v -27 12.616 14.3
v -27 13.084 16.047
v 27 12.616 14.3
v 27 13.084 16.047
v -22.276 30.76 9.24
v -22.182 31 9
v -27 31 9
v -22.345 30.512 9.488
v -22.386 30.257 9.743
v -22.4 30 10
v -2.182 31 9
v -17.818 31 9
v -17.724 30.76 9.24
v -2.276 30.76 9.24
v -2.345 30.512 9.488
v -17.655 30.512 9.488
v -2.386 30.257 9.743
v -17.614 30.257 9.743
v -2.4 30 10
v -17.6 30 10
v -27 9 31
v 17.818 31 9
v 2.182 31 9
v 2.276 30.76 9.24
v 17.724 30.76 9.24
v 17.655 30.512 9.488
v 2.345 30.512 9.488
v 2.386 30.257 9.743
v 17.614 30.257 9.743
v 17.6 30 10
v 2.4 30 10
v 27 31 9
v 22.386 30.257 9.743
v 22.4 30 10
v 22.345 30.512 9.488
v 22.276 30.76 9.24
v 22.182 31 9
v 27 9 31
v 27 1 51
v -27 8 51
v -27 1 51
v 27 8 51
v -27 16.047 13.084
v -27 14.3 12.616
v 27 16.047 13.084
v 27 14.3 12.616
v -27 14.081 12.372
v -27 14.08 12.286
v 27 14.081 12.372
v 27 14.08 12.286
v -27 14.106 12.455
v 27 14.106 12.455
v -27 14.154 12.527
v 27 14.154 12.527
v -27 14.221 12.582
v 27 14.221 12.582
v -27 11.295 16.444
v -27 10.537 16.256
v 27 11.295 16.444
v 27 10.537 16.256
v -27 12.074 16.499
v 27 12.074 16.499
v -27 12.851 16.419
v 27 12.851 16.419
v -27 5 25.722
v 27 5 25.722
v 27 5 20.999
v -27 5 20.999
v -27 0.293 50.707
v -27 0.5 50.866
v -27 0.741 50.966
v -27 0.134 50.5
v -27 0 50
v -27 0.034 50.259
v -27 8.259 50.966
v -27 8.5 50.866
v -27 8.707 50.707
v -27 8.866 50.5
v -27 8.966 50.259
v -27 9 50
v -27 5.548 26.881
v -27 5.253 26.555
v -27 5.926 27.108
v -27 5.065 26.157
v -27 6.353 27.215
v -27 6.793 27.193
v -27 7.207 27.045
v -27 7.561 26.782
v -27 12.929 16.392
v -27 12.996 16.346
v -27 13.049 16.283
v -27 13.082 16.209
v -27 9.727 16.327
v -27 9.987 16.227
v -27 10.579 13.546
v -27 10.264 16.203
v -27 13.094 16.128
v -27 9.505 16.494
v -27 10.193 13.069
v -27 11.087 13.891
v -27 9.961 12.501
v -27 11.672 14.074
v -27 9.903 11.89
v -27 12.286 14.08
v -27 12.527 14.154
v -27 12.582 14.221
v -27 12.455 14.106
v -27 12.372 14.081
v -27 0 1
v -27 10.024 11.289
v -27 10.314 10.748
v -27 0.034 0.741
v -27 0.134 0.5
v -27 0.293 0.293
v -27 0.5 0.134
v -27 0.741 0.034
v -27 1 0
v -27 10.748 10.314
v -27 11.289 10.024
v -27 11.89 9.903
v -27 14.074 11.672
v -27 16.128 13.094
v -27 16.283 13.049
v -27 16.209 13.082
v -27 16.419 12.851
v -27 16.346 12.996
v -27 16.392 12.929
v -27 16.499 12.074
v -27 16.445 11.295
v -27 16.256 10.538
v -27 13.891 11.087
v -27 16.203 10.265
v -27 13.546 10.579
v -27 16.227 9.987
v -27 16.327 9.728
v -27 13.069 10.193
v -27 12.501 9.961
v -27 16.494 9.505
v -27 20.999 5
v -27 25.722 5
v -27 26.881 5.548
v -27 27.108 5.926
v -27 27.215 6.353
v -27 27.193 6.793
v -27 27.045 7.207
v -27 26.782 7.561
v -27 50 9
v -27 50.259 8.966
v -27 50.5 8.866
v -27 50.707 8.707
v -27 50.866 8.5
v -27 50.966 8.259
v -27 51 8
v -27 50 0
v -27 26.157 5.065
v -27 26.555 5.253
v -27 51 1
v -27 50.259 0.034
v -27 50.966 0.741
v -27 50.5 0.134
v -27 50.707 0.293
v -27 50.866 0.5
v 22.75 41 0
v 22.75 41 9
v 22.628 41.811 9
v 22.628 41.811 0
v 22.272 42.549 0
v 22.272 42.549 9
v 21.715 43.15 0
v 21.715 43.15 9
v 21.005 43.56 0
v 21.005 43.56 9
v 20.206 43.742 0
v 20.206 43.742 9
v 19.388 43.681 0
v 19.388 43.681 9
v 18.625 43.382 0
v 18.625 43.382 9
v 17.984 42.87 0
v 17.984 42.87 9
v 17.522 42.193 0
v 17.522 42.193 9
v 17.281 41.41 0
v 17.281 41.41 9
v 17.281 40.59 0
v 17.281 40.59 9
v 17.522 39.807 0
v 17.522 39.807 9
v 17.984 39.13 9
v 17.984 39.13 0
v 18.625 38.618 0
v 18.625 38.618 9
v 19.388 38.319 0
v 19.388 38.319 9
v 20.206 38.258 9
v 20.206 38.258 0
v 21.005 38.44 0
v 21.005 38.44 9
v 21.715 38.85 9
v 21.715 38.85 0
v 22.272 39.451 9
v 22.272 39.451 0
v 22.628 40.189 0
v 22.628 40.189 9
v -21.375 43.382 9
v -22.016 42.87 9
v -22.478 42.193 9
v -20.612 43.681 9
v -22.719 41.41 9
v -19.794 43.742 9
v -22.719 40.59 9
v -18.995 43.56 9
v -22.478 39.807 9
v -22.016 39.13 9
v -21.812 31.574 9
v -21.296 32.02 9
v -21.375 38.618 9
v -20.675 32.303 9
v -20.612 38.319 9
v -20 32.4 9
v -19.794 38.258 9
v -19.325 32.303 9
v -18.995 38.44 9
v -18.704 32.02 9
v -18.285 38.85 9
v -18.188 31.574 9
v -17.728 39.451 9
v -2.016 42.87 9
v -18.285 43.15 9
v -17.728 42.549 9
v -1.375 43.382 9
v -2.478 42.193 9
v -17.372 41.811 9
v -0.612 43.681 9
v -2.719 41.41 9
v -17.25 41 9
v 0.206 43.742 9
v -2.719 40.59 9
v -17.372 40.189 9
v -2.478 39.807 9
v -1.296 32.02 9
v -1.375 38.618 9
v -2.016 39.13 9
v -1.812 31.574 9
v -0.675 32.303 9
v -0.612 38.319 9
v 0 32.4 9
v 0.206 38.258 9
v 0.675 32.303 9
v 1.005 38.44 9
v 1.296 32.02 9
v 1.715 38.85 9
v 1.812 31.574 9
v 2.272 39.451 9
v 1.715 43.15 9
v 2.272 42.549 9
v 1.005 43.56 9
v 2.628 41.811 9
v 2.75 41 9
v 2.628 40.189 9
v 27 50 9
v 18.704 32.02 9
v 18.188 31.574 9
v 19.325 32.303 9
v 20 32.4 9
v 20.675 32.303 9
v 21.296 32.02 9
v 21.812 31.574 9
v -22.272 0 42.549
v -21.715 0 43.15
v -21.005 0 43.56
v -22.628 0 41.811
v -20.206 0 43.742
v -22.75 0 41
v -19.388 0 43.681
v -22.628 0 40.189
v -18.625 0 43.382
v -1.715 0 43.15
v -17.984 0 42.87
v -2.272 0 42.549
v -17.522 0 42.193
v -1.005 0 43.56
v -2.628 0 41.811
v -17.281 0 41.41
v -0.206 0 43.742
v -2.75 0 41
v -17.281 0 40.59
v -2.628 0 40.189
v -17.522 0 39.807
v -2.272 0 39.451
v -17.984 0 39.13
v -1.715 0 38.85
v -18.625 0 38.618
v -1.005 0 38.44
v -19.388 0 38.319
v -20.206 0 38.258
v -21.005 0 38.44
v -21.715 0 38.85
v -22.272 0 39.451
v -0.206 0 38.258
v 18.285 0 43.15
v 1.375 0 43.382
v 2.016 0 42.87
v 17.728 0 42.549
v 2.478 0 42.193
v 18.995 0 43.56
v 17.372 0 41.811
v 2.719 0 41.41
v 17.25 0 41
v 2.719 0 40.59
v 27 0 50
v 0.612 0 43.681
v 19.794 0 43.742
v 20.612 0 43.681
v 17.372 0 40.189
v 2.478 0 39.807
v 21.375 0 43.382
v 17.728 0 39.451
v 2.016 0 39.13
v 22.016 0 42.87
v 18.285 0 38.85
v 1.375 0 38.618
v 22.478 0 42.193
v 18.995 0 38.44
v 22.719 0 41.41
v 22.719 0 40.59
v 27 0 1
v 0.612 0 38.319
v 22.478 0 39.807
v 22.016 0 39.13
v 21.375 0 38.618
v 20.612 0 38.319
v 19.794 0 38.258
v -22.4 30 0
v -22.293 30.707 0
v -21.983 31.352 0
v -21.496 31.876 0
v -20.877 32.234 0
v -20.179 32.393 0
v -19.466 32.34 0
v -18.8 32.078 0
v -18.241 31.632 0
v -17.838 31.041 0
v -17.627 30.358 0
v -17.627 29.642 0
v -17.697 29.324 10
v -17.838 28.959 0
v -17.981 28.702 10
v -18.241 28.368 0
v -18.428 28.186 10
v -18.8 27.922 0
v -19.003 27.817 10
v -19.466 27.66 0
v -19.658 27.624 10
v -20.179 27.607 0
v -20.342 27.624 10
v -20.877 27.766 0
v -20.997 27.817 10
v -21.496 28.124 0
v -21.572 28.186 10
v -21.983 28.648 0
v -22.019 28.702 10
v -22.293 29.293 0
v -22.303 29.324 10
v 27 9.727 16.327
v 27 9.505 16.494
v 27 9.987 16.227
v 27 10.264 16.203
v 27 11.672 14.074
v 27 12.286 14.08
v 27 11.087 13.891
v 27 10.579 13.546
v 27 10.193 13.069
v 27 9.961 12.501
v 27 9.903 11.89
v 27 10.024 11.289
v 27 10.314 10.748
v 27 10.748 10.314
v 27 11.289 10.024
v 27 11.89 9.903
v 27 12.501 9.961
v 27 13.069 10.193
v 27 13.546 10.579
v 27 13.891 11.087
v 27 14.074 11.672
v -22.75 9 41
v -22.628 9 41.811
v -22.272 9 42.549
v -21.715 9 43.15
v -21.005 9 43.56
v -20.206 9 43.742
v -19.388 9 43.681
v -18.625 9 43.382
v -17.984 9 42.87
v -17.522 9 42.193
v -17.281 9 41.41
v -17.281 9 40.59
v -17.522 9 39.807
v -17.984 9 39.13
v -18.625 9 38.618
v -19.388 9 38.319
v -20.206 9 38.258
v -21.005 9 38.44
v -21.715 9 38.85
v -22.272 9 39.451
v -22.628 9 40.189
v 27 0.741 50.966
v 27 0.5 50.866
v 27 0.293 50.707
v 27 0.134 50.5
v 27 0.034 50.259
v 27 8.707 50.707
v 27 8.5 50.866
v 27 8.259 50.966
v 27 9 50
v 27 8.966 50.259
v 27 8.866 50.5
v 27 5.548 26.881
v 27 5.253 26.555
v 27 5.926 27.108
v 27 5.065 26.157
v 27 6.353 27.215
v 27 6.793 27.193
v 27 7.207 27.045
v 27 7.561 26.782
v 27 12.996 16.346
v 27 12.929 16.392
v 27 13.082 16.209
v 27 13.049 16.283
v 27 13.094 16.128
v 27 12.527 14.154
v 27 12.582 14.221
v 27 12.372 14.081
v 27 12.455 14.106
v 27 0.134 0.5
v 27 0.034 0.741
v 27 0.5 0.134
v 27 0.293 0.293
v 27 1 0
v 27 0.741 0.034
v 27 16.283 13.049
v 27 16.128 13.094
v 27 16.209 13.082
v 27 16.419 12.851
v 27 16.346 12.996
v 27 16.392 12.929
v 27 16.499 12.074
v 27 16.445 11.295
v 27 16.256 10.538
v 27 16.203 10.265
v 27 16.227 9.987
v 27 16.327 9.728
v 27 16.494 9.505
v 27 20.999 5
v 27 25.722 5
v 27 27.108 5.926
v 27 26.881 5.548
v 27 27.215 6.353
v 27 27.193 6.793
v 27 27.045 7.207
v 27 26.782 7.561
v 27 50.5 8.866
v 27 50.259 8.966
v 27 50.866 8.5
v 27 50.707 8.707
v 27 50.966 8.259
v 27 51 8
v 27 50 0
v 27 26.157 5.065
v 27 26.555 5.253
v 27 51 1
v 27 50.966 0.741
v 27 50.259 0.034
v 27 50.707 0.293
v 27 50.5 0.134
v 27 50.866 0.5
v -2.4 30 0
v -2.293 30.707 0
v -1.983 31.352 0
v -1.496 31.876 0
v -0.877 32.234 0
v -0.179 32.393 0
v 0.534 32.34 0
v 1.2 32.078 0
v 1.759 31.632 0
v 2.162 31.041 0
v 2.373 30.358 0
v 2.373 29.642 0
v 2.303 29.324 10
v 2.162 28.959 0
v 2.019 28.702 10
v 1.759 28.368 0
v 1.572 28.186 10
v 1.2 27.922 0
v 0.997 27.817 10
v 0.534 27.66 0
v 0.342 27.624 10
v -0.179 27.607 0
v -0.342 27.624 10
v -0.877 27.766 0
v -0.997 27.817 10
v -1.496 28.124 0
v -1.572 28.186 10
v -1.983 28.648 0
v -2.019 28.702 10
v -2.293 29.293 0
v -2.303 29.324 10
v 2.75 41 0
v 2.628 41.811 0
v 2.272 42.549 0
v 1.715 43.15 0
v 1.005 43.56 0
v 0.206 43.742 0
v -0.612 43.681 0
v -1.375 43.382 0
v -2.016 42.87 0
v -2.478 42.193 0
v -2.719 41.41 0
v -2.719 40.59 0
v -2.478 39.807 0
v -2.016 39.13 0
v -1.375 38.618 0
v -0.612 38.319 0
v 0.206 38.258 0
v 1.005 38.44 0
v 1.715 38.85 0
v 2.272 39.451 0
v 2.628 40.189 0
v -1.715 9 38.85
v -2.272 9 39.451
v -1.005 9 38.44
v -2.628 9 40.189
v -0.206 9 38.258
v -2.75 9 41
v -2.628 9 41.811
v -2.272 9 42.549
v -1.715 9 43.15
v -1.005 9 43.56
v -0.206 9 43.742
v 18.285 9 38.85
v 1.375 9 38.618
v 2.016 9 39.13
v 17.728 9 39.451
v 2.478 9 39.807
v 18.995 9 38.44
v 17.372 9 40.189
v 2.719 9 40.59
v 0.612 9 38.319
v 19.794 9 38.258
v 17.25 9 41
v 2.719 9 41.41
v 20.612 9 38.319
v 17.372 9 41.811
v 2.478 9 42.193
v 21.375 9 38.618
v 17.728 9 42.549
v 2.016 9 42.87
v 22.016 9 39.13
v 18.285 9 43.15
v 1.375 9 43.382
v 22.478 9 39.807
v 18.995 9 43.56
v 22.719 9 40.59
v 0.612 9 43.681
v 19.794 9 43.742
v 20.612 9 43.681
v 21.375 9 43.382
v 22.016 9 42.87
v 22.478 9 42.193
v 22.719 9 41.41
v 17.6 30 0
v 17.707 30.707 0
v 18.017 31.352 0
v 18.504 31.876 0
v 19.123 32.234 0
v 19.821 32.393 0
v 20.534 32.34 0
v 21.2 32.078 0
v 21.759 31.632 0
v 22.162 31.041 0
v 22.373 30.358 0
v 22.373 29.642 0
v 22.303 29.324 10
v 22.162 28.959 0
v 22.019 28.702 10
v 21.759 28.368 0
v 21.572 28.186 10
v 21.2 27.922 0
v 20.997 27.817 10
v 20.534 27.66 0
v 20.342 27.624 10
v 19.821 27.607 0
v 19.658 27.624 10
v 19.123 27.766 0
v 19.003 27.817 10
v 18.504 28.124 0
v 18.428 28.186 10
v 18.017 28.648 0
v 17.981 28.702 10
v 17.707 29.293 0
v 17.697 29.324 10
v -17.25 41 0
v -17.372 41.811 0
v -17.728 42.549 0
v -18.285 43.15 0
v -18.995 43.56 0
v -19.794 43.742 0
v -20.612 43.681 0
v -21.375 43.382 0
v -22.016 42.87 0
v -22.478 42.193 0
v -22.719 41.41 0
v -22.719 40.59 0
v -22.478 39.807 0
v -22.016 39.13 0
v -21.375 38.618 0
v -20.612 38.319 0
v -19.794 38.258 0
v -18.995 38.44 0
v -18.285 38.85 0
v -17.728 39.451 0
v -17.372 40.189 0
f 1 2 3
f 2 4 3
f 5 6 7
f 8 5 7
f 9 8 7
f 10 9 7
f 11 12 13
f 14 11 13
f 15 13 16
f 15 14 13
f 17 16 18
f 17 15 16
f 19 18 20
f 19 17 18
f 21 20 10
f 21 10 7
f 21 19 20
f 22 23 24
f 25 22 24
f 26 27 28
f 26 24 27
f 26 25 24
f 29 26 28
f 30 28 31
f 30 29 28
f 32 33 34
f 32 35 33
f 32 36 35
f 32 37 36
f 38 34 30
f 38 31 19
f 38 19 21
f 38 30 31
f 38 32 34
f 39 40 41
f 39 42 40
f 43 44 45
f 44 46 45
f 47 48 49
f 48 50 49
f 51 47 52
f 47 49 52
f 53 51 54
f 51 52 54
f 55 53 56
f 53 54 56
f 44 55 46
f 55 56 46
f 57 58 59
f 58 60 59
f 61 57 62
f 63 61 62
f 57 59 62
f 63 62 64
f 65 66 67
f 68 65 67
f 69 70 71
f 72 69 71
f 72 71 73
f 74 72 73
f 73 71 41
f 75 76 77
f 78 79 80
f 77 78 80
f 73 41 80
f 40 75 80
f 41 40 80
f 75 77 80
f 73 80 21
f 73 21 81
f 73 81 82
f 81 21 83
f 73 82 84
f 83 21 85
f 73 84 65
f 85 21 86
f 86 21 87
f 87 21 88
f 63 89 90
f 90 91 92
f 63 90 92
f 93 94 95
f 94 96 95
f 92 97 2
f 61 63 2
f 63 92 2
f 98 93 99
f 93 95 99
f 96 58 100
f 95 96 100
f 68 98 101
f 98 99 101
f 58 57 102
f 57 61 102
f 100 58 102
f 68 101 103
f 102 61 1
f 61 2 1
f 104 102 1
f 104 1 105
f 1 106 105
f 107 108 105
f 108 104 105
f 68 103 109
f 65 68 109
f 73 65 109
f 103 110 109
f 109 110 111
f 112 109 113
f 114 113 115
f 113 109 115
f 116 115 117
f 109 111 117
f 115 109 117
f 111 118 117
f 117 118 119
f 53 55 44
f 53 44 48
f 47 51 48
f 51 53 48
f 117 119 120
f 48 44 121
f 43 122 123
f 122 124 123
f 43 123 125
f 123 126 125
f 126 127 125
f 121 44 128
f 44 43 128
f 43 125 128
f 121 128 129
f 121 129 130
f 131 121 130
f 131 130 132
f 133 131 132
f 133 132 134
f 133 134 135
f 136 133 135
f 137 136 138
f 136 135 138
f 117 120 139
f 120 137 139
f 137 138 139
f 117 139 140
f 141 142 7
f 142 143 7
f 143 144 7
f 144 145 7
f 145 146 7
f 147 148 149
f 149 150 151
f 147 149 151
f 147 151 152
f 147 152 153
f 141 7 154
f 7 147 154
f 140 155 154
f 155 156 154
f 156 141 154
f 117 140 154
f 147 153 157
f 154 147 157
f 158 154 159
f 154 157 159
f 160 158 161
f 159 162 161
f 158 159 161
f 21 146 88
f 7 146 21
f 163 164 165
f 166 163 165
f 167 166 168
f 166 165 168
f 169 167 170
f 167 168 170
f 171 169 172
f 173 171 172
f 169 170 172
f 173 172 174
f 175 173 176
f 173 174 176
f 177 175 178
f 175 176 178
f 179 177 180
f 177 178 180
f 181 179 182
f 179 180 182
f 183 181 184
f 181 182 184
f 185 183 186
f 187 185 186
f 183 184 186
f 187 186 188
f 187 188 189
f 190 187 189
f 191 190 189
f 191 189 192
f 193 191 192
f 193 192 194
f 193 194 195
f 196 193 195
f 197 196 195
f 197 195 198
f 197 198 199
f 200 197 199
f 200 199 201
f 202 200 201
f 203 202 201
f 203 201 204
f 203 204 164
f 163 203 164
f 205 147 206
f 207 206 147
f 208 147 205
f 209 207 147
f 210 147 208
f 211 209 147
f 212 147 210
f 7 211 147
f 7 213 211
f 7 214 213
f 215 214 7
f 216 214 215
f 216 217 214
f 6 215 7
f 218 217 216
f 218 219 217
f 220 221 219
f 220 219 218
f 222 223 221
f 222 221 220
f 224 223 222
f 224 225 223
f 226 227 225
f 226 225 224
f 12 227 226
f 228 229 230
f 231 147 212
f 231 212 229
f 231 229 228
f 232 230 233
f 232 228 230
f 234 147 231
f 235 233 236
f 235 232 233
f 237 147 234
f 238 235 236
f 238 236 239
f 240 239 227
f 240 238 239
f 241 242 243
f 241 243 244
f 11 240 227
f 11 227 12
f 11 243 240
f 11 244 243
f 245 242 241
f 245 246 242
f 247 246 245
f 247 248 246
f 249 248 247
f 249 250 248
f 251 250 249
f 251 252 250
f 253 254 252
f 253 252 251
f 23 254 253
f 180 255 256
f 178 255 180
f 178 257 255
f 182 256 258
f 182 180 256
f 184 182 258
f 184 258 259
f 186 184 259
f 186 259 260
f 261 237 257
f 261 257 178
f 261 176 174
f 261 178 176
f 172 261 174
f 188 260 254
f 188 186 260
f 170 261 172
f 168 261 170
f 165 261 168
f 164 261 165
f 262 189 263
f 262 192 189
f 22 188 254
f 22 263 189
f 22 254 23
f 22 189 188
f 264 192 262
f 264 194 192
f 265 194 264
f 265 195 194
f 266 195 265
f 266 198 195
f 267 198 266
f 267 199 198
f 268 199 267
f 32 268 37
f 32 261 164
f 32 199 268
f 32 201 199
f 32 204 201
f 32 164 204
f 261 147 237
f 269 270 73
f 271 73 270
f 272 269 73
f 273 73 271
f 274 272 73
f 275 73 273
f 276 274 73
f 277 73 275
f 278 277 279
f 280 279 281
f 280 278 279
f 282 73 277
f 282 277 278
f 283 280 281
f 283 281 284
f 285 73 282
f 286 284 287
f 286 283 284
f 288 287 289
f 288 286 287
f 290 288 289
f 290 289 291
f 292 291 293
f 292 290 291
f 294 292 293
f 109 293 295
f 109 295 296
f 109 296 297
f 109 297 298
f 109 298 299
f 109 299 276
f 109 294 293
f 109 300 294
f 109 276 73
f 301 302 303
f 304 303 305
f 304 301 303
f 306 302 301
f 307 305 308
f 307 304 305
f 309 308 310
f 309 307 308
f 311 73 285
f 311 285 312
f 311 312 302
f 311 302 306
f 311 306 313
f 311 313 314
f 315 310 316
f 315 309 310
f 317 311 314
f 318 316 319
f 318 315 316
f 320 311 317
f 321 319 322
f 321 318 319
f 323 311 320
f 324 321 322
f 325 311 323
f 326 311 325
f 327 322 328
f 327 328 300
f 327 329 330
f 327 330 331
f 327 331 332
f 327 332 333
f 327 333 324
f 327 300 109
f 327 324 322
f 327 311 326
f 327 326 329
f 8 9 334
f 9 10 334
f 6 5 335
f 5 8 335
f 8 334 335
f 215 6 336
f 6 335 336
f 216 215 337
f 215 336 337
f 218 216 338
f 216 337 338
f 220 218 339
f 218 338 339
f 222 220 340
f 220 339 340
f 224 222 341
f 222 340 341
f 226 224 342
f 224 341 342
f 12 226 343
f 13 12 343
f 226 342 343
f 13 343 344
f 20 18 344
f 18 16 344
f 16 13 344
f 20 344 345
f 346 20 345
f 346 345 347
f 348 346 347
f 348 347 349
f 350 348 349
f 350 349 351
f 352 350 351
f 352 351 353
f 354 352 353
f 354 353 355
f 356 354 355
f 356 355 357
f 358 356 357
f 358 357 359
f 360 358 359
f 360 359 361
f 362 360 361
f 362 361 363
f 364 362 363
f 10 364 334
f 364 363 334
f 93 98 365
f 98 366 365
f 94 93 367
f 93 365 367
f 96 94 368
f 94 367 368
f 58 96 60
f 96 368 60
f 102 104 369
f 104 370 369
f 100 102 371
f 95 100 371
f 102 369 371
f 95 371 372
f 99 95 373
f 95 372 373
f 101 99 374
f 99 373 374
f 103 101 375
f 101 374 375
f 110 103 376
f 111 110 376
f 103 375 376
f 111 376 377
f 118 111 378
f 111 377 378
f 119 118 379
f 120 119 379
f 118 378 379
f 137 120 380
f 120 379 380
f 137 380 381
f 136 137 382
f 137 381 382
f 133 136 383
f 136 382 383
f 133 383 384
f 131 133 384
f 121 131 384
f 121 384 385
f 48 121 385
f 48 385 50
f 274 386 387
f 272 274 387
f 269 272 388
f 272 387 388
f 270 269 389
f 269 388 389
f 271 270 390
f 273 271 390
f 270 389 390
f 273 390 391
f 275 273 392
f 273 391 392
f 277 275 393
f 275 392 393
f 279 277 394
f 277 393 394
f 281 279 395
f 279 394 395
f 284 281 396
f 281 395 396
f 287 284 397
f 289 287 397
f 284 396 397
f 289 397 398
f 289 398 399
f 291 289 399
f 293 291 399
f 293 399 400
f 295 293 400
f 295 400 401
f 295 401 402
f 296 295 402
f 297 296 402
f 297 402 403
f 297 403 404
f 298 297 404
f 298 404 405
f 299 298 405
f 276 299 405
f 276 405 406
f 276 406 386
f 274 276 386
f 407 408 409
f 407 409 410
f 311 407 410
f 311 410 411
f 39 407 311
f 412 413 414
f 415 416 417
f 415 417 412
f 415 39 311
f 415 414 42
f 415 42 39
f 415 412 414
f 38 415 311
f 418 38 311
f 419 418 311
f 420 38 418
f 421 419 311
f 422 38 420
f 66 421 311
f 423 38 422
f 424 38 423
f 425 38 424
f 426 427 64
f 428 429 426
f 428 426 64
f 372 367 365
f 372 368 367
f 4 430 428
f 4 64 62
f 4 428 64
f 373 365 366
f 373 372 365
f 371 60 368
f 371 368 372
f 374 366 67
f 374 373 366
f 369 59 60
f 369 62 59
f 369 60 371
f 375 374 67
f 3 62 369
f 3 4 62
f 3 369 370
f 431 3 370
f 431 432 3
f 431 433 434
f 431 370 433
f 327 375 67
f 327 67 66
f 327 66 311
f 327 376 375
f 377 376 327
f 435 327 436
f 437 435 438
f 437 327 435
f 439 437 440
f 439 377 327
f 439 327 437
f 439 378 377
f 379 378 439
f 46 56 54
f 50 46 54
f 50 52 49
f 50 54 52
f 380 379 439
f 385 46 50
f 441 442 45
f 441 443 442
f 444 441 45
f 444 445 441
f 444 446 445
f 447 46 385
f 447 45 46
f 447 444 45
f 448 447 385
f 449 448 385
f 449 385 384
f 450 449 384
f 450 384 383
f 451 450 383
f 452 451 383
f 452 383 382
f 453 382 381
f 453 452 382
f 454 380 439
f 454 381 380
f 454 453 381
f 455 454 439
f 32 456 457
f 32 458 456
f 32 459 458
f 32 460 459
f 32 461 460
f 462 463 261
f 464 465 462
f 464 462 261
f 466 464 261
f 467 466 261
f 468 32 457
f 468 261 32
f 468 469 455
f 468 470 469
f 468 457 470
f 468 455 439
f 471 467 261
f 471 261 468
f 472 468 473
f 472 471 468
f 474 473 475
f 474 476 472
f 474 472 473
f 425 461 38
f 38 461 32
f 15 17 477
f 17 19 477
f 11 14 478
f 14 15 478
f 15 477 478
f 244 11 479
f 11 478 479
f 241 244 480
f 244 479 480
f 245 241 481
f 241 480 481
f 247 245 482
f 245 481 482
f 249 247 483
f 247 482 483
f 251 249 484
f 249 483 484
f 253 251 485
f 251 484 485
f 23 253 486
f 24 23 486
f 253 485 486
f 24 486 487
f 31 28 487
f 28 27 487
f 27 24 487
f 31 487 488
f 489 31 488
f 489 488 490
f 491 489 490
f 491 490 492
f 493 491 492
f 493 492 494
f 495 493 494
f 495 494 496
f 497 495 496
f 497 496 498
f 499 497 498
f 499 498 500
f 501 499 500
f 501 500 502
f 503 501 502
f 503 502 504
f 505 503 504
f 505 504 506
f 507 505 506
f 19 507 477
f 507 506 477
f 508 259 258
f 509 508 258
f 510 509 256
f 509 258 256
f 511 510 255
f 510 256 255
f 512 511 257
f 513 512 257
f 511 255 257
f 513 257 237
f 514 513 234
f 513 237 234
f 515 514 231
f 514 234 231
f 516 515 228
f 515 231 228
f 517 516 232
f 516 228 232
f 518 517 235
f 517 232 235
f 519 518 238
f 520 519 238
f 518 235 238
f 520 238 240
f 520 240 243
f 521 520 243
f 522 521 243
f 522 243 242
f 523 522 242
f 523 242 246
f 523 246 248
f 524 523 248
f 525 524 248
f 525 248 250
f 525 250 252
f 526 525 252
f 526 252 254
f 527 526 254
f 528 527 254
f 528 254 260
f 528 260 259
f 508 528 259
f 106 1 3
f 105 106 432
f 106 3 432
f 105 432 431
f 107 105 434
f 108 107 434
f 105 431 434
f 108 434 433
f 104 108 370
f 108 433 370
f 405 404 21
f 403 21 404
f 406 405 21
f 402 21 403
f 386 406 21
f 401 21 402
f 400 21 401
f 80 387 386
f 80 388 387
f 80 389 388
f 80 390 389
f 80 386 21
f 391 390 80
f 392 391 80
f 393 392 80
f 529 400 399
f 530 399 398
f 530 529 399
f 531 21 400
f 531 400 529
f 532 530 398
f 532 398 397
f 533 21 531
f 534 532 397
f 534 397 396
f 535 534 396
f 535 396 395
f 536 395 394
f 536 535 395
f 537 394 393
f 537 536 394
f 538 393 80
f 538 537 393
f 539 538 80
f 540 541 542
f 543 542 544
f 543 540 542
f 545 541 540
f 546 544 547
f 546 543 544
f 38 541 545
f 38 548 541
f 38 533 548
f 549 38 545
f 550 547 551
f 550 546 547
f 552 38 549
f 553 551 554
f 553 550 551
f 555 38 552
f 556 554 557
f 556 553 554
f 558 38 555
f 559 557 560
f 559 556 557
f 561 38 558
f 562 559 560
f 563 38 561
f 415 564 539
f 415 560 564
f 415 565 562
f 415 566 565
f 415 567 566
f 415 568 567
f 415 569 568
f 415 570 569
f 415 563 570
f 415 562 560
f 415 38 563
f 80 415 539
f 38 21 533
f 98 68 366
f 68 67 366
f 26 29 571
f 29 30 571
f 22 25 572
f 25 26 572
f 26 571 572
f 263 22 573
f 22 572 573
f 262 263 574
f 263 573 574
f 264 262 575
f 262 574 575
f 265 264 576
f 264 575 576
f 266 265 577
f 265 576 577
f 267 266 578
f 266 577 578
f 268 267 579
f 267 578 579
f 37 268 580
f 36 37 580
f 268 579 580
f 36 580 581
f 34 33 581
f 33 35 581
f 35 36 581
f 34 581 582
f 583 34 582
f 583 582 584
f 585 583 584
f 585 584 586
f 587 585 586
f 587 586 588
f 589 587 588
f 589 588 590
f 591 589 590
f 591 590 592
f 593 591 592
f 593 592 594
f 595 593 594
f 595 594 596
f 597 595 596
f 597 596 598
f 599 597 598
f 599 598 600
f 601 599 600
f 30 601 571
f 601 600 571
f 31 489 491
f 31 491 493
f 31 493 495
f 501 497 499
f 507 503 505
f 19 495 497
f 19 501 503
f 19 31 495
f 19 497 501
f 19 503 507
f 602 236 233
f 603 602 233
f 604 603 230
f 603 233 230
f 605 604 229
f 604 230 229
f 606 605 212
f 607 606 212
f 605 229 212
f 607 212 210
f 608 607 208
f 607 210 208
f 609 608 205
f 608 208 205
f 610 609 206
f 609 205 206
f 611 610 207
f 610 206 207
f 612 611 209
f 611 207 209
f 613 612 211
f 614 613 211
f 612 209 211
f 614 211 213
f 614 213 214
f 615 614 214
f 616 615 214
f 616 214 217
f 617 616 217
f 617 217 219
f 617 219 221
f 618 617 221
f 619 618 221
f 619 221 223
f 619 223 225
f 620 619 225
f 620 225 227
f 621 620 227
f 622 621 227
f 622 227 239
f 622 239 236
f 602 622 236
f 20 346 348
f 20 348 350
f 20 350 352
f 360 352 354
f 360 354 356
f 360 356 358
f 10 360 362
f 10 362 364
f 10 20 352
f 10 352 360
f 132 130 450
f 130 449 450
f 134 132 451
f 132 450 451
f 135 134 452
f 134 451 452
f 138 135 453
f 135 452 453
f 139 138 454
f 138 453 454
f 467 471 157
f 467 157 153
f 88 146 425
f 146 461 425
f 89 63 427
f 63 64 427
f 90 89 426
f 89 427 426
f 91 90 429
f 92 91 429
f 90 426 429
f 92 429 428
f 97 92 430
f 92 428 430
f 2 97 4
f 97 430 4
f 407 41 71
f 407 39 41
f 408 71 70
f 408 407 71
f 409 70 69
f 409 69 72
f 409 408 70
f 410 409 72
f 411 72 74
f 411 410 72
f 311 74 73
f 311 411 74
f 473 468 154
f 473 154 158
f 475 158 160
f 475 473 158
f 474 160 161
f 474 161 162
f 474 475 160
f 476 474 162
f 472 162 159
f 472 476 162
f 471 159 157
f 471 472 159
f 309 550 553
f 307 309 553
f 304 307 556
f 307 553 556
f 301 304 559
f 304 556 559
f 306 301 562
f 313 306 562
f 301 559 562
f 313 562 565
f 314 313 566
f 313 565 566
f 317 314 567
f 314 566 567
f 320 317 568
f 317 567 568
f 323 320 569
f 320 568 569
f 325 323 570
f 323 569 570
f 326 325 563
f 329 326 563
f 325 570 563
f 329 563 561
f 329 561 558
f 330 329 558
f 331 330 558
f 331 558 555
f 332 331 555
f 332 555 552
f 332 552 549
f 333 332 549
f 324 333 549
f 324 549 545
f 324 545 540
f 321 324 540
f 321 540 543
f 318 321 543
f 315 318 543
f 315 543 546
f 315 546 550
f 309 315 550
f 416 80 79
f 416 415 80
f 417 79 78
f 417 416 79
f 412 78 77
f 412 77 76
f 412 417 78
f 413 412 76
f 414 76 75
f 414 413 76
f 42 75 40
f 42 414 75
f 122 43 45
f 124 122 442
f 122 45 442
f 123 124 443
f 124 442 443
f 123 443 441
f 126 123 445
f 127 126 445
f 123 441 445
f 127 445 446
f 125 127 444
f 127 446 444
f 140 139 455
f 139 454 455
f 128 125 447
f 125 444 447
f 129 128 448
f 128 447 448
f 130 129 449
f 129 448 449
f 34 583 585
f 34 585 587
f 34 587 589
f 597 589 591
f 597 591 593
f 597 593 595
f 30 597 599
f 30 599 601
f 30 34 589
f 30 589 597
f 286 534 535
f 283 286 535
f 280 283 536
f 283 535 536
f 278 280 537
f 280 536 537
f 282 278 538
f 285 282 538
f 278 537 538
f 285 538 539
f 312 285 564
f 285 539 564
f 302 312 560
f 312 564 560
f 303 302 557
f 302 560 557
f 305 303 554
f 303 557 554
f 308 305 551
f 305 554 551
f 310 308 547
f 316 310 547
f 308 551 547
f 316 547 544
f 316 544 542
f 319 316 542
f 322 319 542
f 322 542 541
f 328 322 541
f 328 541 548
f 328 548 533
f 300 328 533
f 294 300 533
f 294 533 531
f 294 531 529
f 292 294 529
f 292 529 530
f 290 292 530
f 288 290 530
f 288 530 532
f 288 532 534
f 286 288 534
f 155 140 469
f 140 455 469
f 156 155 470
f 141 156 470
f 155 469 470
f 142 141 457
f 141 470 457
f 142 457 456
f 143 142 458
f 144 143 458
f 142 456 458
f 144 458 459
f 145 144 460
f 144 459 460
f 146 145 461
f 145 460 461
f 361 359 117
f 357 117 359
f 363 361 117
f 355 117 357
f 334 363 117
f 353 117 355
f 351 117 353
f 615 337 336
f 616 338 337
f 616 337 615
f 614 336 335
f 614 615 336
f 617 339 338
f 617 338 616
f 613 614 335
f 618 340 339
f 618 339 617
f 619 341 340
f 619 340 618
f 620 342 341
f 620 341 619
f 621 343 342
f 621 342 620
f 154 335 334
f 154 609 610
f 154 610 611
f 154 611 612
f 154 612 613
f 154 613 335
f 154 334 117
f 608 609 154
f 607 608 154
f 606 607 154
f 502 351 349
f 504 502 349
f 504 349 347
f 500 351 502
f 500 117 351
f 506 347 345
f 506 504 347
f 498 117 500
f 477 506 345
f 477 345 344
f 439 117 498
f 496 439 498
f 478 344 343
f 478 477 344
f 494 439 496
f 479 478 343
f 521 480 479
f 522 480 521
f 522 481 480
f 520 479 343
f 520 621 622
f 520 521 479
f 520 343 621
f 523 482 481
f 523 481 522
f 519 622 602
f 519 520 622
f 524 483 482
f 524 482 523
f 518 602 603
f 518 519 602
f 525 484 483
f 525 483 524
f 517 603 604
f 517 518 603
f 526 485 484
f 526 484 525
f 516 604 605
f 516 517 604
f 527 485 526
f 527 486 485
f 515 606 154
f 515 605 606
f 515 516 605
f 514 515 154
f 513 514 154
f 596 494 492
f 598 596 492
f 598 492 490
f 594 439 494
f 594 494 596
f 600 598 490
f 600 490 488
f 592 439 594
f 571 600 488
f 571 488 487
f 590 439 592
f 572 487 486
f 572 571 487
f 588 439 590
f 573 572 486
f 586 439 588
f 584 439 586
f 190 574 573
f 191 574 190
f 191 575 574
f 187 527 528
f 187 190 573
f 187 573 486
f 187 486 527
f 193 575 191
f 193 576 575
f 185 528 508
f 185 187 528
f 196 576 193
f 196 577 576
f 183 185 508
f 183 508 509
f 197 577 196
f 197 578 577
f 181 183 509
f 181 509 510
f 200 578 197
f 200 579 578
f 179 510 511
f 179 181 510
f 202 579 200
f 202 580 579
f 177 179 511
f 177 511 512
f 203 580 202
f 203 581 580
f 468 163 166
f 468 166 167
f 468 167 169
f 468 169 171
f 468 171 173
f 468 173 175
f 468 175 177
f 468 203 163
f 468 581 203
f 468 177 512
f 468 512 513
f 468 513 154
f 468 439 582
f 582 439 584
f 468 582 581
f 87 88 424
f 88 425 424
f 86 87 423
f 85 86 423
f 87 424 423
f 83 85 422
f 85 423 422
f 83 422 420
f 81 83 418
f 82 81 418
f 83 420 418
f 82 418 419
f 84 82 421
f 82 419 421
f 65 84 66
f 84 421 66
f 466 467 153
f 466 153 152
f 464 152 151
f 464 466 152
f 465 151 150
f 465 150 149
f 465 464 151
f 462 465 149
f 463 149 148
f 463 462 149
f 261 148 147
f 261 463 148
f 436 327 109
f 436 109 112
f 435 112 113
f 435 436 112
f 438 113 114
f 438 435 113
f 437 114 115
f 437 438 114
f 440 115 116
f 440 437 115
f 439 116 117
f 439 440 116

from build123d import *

# Parameters (mm, degrees)
BOSS_EXTRUDE1_DEPTH      = 27
BOSS_EXTRUDE1_DEPTH_BACK = 27
SKETCH6_R                = 2.75
CUT_EXTRUDE5_DEPTH       = 72.37226352
SKETCH7_R                = 2.75
CUT_EXTRUDE6_DEPTH       = 72.37226352
SKETCH9_R                = 2.4
CUT_EXTRUDE7_DEPTH       = 10


with BuildPart() as part:
    # Sketch1 → Boss-Extrude1 (new, two sides: drawn at the far end of the back side and taken through both)
    with BuildSketch(Plane(origin=(0, 0, 0), x_dir=(0, 0, -1), z_dir=(1, 0, 0)).offset(-BOSS_EXTRUDE1_DEPTH_BACK)):
        with BuildLine():
            Line((-50, 0), (-1, 0))
            ThreePointArc((-1, 0), (-0.292893219, 0.292893219), (0, 1))
            Line((0, 1), (0, 50))
            ThreePointArc((0, 50), (-0.292893219, 50.707106781), (-1, 51))
            Line((-1, 51), (-8, 51))
            ThreePointArc((-8, 51), (-8.707106781, 50.707106781), (-9, 50))
            Line((-9, 50), (-9, 31))
            Line((-9, 31), (-31, 9))
            Line((-31, 9), (-50, 9))
            ThreePointArc((-50, 9), (-50.707106781, 8.707106781), (-51, 8))
            Line((-51, 8), (-51, 1))
            ThreePointArc((-51, 1), (-50.707106781, 0.292893219), (-50, 0))
        make_face()
        with BuildLine():
            Line((-25.721825407, 5), (-20.999285733, 5))
            Line((-20.999285733, 5), (-16.494036438, 9.505249294))
            ThreePointArc((-16.494036438, 9.505249294), (-16.226979866, 9.987090789), (-16.255625497, 10.537245192))
            ThreePointArc((-16.255625497, 10.537245192), (-16.488859314, 11.683547702), (-16.418755424, 12.851234691))
            ThreePointArc((-16.418755424, 12.851234691), (-16.283360667, 13.048766752), (-16.046526031, 13.084263382))
            Line((-16.046526031, 13.084263382), (-14.300039569, 12.616293745))
            ThreePointArc((-14.300039569, 12.616293745), (-14.127781033, 12.492491496), (-14.080474622, 12.285701498))
            ThreePointArc((-14.080474622, 12.285701498), (-10.515075745, 10.515075774), (-12.285701539, 14.080474617))
            ThreePointArc((-12.285701539, 14.080474617), (-12.492491514, 14.127781045), (-12.616293745, 14.300039569))
            Line((-12.616293745, 14.300039569), (-13.084263382, 16.046526031))
            ThreePointArc((-13.084263382, 16.046526031), (-13.048766728, 16.283360705), (-12.851234602, 16.418755442))
            ThreePointArc((-12.851234602, 16.418755442), (-11.683774102, 16.488875269), (-10.537674556, 16.255773055))
            ThreePointArc((-10.537674556, 16.255773055), (-9.987311976, 16.226928716), (-9.505249294, 16.494036438))
            Line((-9.505249294, 16.494036438), (-5, 20.999285733))
            Line((-5, 20.999285733), (-5, 25.721825407))
            ThreePointArc((-5, 25.721825407), (-5.925974851, 27.107644706), (-7.560660172, 26.782485579))
            Line((-7.560660172, 26.782485579), (-26.782485579, 7.560660172))
            ThreePointArc((-26.782485579, 7.560660172), (-27.107644706, 5.925974851), (-25.721825407, 5))
        make_face(mode=Mode.SUBTRACT)
    extrude(amount=BOSS_EXTRUDE1_DEPTH + BOSS_EXTRUDE1_DEPTH_BACK)

    # Sketch6 → Cut-Extrude5 (cut, through all)
    with BuildSketch(Plane.XY.offset(9)):
        with Locations((-20, 41)):
            Circle(SKETCH6_R)
        with Locations((0, 41)):
            Circle(SKETCH6_R)
        with Locations((20, 41)):
            Circle(SKETCH6_R)
    extrude(amount=-CUT_EXTRUDE5_DEPTH, mode=Mode.SUBTRACT)

    # Sketch7 → Cut-Extrude6 (cut, through all)
    with BuildSketch(Plane(origin=(0, 9, 0), x_dir=(-1, 0, 0), z_dir=(0, 1, 0))):
        with Locations((20, 41)):
            Circle(SKETCH7_R)
        with Locations((0, 41)):
            Circle(SKETCH7_R)
        with Locations((-20, 41)):
            Circle(SKETCH7_R)
    extrude(amount=-CUT_EXTRUDE6_DEPTH, mode=Mode.SUBTRACT)

    # Sketch9 → Cut-Extrude7 (cut)
    with BuildSketch(Plane(origin=(0, 0, 0), x_dir=(-1, 0, 0), z_dir=(0, 0, -1))):
        with Locations((20, 30)):
            Circle(SKETCH9_R)
        with Locations((-20, 30)):
            Circle(SKETCH9_R)
        with Locations((0, 30)):
            Circle(SKETCH9_R)
    extrude(amount=-CUT_EXTRUDE7_DEPTH, mode=Mode.SUBTRACT)


solid = part.part
